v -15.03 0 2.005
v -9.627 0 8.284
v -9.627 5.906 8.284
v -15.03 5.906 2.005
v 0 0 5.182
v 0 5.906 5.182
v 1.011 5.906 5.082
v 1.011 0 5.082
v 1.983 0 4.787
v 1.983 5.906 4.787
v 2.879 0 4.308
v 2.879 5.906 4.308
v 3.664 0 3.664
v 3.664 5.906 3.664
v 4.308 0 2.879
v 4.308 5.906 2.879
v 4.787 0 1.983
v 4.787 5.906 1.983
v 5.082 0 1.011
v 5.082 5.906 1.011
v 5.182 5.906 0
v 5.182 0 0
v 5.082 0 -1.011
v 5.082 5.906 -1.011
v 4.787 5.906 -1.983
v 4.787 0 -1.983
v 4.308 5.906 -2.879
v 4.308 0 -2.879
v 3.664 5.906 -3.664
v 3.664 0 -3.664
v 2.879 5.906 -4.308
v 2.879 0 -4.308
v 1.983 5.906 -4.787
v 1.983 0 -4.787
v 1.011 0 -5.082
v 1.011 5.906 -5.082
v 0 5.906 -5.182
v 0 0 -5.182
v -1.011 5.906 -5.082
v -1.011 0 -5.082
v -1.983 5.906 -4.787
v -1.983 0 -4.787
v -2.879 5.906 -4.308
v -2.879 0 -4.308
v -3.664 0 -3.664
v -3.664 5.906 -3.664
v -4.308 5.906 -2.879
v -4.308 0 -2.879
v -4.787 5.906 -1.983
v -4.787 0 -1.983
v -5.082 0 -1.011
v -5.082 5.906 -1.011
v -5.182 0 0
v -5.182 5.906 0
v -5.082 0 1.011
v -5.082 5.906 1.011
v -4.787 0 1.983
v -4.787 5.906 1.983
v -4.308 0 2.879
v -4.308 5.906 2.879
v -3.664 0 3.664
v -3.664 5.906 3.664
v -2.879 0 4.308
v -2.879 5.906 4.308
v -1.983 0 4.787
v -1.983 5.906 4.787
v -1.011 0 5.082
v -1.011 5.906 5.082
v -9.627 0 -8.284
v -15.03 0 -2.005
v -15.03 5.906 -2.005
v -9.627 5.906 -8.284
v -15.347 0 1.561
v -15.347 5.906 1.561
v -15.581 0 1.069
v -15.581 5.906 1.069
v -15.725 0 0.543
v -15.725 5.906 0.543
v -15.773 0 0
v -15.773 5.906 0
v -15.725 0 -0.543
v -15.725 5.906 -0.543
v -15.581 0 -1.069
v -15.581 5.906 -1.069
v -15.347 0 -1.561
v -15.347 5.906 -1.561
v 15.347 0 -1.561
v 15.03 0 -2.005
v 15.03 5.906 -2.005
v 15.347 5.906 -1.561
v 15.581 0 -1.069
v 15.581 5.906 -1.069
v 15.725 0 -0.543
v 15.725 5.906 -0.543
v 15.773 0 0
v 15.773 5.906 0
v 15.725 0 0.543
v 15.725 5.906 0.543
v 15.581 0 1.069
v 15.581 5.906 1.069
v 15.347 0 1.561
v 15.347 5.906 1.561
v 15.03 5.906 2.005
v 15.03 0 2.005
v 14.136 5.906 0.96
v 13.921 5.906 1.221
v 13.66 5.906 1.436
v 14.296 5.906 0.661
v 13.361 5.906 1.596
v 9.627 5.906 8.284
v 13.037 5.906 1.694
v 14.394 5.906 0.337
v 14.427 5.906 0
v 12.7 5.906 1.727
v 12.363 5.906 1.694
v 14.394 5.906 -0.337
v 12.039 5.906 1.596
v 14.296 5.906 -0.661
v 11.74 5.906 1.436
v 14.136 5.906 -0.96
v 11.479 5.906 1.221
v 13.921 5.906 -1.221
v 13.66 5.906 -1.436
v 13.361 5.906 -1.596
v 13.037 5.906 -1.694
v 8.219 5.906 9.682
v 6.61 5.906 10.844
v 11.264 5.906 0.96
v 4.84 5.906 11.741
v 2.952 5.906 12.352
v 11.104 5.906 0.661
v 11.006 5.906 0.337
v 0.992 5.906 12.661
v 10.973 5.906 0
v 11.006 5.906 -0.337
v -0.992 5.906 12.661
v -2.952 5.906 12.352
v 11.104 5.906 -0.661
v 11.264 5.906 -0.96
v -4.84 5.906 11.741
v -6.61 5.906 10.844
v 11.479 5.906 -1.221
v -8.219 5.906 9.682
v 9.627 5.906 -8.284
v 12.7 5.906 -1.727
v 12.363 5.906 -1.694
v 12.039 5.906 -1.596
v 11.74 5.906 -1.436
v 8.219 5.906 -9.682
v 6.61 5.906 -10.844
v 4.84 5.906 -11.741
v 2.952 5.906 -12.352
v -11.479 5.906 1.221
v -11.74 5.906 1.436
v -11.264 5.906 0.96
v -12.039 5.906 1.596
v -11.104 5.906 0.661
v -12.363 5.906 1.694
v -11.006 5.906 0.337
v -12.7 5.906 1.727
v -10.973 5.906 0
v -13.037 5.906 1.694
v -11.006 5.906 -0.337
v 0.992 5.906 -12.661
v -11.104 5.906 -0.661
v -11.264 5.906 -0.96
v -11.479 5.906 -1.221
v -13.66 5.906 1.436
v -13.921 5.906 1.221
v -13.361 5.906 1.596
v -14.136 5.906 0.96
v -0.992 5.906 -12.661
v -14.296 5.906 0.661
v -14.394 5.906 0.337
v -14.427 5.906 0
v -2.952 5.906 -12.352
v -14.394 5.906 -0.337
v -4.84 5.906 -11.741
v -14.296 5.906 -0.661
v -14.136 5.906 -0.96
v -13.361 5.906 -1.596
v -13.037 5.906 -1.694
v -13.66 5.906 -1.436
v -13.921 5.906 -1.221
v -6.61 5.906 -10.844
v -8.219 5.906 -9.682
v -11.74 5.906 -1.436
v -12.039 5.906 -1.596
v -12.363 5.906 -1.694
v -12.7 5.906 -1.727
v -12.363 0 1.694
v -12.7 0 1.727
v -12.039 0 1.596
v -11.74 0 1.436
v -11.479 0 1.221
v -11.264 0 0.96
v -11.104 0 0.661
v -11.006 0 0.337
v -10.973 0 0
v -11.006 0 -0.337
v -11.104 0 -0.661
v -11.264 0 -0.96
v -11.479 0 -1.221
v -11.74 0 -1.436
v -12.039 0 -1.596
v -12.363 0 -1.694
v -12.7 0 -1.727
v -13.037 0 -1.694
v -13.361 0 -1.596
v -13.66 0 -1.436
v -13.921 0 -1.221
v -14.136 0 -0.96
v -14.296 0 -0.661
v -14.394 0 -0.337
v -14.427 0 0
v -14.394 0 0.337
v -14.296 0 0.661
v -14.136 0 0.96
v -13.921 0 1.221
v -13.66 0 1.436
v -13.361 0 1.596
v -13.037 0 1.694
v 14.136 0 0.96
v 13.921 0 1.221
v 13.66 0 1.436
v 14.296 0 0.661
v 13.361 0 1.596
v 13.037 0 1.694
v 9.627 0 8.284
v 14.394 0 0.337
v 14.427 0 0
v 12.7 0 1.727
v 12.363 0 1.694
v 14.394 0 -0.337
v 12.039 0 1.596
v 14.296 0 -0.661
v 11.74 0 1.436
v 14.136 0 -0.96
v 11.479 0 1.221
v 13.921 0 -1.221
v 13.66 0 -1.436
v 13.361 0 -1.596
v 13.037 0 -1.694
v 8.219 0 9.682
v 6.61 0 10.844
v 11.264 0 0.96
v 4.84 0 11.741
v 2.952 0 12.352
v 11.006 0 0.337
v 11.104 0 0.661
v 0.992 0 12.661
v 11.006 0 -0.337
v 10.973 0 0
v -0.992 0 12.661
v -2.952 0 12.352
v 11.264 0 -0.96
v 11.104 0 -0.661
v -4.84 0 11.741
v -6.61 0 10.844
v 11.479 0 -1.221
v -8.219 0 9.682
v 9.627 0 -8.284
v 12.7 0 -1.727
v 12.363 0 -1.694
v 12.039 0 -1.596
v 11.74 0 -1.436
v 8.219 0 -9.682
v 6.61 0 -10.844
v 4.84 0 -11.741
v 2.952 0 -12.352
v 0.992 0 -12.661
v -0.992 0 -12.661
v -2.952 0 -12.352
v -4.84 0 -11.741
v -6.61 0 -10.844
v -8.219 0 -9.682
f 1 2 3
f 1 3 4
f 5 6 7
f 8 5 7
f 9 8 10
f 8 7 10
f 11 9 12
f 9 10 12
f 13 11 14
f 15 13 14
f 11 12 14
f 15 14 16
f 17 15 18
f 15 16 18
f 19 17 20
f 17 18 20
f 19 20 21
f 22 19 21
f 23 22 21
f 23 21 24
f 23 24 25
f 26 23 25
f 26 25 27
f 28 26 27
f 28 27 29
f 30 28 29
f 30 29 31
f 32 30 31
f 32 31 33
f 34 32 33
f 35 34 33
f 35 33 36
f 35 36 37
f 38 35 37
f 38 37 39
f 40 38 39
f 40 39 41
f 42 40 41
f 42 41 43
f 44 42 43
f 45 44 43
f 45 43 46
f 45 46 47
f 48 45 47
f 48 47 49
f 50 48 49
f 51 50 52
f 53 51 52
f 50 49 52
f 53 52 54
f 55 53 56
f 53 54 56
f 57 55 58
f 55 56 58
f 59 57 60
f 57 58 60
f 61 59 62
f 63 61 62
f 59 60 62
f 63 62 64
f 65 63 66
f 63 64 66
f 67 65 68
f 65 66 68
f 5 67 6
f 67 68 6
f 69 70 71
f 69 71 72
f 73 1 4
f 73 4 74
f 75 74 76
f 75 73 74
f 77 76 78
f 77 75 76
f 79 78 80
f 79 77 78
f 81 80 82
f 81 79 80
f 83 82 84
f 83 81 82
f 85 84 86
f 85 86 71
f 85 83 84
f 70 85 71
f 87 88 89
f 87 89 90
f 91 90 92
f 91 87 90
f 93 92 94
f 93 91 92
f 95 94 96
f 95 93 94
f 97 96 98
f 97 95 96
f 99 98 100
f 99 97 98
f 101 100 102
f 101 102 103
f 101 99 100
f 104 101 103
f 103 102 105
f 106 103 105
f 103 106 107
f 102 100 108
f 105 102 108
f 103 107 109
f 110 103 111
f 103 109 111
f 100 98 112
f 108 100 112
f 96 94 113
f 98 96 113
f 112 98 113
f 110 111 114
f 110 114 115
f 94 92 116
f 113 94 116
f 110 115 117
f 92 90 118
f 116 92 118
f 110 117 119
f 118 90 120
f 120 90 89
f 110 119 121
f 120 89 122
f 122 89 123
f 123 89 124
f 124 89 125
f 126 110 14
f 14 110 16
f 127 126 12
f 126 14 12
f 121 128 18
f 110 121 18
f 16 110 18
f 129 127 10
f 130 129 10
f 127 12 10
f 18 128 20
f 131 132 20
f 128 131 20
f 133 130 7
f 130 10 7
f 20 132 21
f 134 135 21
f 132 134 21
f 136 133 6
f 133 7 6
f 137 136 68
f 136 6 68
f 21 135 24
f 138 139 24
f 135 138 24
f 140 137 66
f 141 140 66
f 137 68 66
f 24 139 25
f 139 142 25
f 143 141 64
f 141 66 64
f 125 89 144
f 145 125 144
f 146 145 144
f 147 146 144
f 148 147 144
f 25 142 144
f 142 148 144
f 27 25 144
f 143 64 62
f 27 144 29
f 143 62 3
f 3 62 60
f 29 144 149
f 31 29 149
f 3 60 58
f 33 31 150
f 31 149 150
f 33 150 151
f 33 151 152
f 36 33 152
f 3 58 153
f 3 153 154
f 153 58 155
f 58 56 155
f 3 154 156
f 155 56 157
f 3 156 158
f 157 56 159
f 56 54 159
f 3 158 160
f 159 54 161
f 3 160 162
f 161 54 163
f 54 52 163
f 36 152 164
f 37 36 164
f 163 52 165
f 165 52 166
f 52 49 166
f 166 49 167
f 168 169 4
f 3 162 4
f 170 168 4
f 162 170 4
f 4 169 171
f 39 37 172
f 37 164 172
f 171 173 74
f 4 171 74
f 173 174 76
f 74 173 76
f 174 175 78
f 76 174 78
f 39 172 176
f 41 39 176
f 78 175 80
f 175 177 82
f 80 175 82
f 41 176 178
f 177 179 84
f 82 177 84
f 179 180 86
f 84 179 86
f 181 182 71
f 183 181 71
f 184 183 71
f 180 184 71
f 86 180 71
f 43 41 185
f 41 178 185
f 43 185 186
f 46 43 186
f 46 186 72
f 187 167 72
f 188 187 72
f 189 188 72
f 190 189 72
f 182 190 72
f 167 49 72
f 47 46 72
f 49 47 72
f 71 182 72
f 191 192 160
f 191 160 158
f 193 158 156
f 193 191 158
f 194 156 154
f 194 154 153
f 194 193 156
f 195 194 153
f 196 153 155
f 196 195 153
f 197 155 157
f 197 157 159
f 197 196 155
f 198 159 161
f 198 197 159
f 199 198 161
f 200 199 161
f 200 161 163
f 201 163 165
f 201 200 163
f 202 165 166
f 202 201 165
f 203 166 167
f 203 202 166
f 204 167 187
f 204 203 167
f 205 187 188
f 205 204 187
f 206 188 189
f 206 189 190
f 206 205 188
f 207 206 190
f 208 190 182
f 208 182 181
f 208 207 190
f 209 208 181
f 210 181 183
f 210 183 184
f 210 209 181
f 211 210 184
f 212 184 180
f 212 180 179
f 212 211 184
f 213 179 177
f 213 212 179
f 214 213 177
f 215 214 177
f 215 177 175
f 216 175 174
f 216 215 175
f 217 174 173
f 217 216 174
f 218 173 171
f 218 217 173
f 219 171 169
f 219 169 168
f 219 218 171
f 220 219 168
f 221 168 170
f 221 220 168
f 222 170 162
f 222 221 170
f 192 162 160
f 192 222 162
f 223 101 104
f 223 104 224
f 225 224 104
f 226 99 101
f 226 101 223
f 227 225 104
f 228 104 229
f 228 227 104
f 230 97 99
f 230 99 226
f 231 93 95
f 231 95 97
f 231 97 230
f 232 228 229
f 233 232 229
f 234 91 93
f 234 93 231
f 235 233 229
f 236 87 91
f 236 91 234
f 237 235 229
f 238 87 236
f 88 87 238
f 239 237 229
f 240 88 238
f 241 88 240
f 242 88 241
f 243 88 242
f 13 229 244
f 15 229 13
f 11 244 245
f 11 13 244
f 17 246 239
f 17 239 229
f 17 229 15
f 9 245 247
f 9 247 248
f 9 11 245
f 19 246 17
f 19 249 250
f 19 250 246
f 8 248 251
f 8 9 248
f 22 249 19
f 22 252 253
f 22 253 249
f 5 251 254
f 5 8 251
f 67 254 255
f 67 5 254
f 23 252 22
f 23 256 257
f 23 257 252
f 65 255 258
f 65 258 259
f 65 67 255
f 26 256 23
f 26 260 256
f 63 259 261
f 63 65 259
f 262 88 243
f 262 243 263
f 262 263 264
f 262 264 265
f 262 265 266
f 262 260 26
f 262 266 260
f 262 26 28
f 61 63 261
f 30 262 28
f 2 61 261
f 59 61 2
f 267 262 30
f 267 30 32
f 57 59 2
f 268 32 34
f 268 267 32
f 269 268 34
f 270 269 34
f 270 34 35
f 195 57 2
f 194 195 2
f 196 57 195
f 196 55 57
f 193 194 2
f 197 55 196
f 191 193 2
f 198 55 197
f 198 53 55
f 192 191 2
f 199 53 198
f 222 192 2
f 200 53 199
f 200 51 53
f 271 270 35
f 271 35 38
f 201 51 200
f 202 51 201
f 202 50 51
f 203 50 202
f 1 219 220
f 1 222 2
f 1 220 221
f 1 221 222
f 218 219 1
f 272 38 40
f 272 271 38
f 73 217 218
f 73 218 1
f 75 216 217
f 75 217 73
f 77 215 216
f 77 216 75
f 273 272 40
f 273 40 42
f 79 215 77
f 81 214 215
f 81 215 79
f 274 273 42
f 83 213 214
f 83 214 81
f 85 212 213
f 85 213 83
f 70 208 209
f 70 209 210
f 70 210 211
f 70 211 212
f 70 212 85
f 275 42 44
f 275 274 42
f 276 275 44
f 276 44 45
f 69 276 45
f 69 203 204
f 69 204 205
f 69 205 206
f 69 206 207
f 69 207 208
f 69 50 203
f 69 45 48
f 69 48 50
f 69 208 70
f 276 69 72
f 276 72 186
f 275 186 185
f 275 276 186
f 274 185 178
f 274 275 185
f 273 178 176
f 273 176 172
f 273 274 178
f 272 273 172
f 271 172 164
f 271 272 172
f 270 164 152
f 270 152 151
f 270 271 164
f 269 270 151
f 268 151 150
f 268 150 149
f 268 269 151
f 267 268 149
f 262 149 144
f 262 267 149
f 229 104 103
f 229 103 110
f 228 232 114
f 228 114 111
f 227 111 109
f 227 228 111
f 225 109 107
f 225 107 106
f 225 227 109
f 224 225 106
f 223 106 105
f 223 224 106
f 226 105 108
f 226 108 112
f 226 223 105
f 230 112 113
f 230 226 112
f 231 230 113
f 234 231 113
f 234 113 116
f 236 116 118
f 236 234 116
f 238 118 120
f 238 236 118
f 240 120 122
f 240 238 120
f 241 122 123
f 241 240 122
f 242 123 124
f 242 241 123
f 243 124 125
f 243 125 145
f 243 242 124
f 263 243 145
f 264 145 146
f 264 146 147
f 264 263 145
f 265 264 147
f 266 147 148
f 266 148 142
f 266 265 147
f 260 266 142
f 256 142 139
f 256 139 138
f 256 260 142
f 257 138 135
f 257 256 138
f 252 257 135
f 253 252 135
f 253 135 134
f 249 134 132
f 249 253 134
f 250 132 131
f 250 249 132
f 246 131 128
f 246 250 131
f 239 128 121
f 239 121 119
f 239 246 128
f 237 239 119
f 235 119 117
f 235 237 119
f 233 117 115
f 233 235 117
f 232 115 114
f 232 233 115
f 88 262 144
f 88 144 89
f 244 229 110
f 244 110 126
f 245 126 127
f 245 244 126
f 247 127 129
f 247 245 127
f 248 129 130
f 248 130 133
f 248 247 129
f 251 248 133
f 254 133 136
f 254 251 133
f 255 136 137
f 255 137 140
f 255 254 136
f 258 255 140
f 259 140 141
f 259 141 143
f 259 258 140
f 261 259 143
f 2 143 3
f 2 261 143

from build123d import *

# Parameters (mm, degrees)
SKETCH1_R           = 1.7272
BOSS_EXTRUDE1_DEPTH = 5.9055
SKETCH6_R           = 5.1816
CUT_EXTRUDE4_DEPTH  = 22.094195358


with BuildPart() as part:
    # Sketch1 → Boss-Extrude1 (new body)
    with BuildSketch(Plane(origin=(0, 0, 0), x_dir=(1, 0, 0), z_dir=(0, 1, 0))):
        with BuildLine():
            Line((-15.0296372, 2.004639139), (-9.6266, 8.283632805))
            ThreePointArc((-9.6266, 8.283632805), (0, 12.7), (9.6266, 8.283632805))
            Line((9.6266, 8.283632805), (15.0296372, 2.004639139))
            ThreePointArc((15.0296372, 2.004639139), (15.7734, 0), (15.0296372, -2.004639139))
            Line((15.0296372, -2.004639139), (9.6266, -8.283632805))
            ThreePointArc((9.6266, -8.283632805), (0, -12.7), (-9.6266, -8.283632805))
            Line((-9.6266, -8.283632805), (-15.0296372, -2.004639139))
            ThreePointArc((-15.0296372, -2.004639139), (-15.7734, 0), (-15.0296372, 2.004639139))
        make_face()
        with Locations(Location((-12.7, 0, 0), (0, 0, 270))):
            Circle(SKETCH1_R, mode=Mode.SUBTRACT)
        with Locations(Location((12.7, 0, 0), (0, 0, 270))):
            Circle(SKETCH1_R, mode=Mode.SUBTRACT)
    extrude(amount=BOSS_EXTRUDE1_DEPTH)

    # Sketch6 → Cut-Extrude4 (cut, through all)
    with BuildSketch(Plane(origin=(0, 5.9055, 0), x_dir=(1, 0, 0), z_dir=(0, 1, 0))):
        with Locations(Location((0, 0, 0), (0, 0, 270))):
            Circle(SKETCH6_R)
    extrude(amount=-CUT_EXTRUDE4_DEPTH, mode=Mode.SUBTRACT)


solid = part.part
